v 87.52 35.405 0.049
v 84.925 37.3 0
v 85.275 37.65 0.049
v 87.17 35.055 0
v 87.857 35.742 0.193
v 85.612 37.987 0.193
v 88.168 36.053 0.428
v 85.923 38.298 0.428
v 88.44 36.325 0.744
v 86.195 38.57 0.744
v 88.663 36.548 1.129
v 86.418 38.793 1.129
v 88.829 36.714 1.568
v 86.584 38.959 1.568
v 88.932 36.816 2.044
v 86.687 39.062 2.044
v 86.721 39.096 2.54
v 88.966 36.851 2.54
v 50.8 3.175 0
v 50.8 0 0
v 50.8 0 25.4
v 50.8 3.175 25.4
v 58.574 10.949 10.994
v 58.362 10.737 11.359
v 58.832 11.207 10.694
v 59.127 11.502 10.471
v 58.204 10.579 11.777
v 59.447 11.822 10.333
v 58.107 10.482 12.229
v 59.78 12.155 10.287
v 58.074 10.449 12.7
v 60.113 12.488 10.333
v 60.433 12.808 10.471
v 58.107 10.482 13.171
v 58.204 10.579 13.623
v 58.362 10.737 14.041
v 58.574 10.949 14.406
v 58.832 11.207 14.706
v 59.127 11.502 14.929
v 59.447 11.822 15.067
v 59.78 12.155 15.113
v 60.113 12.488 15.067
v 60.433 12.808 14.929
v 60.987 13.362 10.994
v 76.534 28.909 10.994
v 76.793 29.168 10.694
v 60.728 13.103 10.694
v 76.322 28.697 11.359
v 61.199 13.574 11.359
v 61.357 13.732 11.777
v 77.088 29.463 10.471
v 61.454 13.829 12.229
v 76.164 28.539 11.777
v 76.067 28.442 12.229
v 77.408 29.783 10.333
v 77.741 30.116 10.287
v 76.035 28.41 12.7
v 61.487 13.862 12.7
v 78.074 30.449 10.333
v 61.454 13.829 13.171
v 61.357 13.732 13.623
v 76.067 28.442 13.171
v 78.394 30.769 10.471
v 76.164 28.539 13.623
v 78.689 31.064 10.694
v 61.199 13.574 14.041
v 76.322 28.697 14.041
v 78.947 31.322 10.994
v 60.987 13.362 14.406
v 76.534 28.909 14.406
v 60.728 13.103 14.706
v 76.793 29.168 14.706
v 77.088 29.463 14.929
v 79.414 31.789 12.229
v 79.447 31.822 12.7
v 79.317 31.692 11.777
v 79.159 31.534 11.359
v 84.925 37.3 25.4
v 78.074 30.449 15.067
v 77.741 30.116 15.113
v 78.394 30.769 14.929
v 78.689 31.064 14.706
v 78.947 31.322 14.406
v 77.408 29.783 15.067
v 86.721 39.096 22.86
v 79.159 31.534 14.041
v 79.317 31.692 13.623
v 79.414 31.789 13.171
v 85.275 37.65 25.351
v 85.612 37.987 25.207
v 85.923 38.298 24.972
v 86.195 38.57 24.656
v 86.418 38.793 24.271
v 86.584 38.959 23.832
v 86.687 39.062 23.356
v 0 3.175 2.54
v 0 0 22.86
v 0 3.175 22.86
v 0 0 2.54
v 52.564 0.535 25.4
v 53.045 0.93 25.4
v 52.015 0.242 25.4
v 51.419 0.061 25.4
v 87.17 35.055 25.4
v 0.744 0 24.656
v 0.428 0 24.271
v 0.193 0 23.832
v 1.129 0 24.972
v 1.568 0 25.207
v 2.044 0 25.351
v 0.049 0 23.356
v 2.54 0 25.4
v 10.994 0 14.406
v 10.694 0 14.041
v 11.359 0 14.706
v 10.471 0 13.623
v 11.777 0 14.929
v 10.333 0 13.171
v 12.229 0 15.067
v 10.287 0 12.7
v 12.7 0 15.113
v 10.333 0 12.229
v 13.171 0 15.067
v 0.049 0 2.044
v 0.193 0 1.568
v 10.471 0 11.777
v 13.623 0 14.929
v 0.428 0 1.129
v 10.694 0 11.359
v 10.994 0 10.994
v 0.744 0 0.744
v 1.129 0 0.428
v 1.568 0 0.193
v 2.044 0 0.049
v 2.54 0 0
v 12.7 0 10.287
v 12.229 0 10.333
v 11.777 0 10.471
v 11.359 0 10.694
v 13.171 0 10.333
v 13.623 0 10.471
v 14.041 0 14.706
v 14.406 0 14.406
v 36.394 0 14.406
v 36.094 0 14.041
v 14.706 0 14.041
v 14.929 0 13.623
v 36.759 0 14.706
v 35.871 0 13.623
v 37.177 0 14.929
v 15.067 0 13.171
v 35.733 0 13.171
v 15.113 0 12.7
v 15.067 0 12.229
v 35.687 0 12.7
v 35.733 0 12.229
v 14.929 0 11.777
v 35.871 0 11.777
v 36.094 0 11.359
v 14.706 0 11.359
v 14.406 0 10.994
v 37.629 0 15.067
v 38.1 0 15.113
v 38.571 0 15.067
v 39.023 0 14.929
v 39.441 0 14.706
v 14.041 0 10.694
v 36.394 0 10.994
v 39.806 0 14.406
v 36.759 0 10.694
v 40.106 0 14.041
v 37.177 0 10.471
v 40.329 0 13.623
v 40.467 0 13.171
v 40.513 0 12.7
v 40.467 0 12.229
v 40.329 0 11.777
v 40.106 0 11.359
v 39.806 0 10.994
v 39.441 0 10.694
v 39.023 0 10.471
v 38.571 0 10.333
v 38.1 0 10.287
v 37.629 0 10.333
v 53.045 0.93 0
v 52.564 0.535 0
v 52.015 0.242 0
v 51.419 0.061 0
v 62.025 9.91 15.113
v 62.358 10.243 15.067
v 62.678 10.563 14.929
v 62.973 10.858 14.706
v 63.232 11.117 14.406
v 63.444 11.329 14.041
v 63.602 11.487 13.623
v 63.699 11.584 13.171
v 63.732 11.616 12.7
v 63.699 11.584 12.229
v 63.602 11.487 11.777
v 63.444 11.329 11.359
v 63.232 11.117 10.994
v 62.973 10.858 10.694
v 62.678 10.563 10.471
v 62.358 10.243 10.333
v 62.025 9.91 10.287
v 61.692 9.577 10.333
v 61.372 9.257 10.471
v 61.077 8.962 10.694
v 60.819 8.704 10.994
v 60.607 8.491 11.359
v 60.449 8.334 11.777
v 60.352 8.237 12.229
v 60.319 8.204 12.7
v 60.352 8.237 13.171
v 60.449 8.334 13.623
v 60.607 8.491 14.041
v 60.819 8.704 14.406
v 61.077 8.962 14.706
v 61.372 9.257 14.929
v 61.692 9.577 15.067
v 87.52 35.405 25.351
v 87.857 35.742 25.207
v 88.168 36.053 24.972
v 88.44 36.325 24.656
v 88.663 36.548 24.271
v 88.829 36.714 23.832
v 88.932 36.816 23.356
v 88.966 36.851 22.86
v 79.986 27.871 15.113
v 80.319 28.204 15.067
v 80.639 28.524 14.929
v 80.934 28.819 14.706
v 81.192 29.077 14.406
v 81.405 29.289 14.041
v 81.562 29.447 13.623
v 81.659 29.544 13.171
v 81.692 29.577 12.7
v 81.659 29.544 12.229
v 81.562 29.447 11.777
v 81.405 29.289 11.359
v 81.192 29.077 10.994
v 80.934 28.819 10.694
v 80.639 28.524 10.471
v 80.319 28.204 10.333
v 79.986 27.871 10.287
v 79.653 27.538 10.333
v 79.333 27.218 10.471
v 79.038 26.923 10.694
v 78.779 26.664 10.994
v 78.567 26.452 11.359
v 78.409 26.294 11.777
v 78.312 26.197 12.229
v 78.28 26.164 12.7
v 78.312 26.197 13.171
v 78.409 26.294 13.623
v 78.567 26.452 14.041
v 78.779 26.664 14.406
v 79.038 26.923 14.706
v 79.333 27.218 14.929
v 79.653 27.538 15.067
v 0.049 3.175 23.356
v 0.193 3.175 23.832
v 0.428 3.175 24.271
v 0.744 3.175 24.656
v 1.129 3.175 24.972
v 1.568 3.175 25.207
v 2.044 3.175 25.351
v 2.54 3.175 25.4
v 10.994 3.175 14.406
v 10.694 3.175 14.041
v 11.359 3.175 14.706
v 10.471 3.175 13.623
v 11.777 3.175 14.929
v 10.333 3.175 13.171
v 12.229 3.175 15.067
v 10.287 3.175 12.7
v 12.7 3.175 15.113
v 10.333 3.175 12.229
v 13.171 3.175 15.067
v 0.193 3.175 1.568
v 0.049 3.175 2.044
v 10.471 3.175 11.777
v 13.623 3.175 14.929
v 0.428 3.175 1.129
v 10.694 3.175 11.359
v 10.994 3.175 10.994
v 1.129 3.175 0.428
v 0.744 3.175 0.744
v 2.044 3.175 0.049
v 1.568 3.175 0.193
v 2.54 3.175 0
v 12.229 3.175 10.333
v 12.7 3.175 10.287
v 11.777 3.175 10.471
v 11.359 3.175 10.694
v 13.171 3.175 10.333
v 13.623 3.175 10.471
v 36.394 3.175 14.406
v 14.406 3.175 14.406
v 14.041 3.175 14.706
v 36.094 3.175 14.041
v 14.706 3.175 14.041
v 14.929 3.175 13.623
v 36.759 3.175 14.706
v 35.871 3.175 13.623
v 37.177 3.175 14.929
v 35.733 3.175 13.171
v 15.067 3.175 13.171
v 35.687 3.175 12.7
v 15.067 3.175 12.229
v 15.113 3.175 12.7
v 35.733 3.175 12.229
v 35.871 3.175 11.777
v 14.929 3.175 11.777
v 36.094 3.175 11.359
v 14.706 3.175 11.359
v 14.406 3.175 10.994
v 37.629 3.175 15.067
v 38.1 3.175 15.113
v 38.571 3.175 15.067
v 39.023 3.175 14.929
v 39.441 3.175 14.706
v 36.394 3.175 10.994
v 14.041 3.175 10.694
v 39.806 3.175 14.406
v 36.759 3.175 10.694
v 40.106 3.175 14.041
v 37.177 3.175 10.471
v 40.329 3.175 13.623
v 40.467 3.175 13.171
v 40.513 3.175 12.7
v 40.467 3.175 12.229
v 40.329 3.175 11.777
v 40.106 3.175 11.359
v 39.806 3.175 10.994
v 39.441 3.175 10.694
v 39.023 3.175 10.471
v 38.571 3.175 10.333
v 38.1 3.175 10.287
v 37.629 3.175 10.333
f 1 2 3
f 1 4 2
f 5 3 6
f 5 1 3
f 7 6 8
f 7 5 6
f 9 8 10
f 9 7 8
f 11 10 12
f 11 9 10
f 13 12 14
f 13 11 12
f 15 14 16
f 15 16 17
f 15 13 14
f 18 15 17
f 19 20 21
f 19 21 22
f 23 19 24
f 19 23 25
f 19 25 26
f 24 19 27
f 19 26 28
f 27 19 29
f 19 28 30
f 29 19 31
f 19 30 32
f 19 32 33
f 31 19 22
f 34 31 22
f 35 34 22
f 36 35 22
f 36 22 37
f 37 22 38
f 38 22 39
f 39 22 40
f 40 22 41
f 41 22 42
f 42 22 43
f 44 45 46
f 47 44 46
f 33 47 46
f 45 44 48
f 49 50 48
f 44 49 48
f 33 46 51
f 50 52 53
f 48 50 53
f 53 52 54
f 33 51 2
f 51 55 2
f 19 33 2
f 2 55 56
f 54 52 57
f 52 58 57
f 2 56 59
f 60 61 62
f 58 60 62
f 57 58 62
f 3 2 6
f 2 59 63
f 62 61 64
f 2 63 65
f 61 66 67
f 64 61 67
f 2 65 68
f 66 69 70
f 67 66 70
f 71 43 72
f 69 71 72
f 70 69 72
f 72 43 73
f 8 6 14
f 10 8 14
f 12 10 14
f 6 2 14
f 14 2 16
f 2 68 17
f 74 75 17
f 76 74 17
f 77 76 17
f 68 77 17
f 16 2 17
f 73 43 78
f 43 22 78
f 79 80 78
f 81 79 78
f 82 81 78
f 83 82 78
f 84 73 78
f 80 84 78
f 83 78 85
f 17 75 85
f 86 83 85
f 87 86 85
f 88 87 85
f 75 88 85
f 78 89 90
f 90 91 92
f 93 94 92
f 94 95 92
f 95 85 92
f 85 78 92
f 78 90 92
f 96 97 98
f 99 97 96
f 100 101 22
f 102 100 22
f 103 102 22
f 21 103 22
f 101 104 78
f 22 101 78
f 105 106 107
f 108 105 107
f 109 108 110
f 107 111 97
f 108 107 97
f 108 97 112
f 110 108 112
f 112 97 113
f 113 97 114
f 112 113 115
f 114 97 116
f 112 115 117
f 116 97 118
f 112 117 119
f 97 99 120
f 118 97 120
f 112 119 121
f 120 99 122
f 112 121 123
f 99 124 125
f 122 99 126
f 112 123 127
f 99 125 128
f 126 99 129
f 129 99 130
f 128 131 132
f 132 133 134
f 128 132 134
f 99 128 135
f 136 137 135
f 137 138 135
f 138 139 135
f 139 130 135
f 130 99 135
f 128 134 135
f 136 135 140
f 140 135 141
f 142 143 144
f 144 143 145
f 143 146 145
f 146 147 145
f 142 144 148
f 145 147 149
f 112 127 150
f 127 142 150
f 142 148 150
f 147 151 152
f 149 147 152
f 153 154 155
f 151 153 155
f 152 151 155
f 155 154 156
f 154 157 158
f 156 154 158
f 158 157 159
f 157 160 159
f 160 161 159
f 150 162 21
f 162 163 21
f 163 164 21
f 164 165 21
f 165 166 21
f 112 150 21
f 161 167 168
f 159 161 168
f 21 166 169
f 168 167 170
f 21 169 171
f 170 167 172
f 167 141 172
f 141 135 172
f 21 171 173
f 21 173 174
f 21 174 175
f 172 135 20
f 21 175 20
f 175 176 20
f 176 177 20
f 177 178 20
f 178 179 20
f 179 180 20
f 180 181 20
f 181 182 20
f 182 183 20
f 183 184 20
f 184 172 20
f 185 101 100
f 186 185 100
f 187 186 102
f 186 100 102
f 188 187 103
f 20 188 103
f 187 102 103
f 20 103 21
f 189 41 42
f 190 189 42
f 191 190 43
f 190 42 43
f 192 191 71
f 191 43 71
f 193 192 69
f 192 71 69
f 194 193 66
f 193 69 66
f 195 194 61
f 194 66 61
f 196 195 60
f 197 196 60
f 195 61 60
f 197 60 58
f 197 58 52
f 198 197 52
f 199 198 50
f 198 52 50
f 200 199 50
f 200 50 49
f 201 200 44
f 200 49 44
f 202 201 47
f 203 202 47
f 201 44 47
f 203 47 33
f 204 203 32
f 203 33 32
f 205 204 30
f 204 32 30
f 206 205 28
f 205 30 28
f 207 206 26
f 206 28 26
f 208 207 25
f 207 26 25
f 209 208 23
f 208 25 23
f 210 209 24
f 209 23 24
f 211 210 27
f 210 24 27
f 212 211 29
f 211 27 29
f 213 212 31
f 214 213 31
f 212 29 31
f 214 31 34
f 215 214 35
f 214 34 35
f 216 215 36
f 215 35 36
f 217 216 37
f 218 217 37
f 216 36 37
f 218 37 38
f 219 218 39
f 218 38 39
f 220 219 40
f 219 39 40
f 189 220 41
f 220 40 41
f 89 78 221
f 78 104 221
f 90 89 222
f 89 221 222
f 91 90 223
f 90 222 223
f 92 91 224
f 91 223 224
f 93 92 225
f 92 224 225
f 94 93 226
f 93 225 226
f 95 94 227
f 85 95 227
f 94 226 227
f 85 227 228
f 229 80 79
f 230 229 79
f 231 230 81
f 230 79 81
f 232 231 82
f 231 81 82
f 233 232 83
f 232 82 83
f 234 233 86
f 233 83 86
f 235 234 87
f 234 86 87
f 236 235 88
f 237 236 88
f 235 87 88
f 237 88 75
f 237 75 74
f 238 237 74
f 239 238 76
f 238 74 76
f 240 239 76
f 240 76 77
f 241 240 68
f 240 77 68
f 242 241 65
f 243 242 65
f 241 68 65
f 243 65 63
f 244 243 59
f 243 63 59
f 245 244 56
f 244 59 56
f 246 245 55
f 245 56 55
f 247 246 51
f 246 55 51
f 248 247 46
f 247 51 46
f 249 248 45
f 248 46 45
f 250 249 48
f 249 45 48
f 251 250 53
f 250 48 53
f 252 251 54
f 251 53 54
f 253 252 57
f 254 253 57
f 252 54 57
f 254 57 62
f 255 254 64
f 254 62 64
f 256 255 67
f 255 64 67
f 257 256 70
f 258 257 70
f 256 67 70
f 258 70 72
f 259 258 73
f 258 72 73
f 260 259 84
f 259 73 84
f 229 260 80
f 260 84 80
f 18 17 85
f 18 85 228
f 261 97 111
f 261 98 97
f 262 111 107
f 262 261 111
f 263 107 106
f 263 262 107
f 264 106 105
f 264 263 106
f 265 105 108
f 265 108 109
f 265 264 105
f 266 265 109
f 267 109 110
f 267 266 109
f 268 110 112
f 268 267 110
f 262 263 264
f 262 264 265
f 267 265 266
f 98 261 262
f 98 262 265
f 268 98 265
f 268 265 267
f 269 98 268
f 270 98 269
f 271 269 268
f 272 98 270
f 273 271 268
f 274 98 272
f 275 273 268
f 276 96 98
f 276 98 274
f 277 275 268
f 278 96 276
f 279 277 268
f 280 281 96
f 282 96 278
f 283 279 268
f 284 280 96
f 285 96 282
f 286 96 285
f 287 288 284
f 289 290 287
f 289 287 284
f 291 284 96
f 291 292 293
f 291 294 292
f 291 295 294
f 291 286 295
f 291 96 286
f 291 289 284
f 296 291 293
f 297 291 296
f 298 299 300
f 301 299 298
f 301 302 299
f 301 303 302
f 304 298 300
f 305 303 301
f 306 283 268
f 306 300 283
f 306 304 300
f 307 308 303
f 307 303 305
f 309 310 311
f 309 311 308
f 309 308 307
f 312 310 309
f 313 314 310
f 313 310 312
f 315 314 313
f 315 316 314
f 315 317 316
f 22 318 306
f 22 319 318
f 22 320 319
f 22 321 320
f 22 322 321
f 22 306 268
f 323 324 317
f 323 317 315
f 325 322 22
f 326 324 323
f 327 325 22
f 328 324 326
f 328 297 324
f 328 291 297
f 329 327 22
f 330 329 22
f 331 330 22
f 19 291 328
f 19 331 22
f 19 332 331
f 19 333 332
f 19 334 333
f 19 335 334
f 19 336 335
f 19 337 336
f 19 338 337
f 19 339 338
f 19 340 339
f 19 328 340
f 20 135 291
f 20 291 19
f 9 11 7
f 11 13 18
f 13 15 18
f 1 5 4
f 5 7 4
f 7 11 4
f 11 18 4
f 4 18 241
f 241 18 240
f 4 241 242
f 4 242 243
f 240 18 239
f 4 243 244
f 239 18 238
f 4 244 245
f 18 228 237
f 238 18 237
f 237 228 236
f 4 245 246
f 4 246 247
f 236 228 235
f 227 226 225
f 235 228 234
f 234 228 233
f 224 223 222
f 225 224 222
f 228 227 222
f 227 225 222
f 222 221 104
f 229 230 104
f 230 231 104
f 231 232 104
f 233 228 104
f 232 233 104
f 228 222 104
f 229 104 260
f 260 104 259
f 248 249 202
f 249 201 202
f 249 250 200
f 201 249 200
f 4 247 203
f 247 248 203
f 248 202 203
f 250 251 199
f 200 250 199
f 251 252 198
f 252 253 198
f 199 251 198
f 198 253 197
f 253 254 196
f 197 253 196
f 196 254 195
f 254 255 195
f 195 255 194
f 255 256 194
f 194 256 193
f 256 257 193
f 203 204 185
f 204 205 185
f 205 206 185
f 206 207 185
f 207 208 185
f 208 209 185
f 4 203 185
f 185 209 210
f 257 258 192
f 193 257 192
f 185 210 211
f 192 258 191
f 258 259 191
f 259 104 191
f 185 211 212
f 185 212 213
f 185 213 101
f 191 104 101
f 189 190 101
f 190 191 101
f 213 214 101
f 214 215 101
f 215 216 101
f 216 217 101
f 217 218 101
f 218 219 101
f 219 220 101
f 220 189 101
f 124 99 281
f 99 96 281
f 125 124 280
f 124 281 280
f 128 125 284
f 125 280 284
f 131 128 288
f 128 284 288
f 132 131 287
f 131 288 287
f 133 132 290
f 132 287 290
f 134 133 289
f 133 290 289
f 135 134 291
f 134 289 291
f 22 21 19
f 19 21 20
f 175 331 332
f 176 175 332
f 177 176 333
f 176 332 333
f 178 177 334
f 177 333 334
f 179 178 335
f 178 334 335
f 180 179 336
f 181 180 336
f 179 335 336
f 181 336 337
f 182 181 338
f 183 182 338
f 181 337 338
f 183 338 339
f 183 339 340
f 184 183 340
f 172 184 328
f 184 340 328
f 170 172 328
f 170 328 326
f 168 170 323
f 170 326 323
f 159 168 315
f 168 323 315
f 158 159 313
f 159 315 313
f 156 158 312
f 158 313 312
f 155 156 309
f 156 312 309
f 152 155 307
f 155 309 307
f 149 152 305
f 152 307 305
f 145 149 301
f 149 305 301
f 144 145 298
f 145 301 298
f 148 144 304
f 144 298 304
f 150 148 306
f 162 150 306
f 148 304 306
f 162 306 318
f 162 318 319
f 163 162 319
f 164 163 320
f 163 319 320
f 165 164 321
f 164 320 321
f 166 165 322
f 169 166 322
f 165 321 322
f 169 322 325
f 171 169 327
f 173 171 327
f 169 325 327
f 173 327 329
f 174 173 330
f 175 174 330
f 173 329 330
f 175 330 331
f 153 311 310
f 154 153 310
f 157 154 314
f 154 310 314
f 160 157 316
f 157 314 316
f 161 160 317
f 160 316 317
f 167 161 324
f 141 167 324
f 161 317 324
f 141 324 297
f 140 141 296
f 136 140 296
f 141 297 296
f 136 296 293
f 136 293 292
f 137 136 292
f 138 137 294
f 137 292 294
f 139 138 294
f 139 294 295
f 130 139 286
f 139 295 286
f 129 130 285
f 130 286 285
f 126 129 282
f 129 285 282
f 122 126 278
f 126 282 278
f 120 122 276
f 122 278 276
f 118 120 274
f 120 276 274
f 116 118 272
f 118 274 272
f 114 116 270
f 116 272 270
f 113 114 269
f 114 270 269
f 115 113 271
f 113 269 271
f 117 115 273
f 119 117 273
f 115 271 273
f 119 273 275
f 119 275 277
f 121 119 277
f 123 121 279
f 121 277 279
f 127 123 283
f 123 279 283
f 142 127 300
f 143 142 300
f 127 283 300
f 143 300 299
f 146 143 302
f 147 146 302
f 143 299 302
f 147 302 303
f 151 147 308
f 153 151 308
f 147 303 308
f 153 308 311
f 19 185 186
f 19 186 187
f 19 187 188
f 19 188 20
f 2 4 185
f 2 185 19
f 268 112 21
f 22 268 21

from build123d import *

# Parameters (mm, degrees)
SKETCH1_W           = 50.8
SKETCH1_H           = 25.4
BOSS_EXTRUDE1_DEPTH = 3.175
BOSS_EXTRUDE2_DEPTH = 25.4
SKETCH4_R           = 2.413
CUT_EXTRUDE1_DEPTH  = 3.175
SKETCH5_R           = 2.413
CUT_EXTRUDE2_DEPTH  = 3.175
FILLET1_R           = 2.54
FILLET2_R           = 2.54


with BuildPart() as part:
    # Sketch1 → Boss-Extrude1 (new body)
    with BuildSketch(Plane(origin=(0, 0, 0), x_dir=(1, 0, 0), z_dir=(0, 1, 0))):
        with Locations((25.4, -12.7)):
            Rectangle(SKETCH1_W, SKETCH1_H)
    extrude(amount=BOSS_EXTRUDE1_DEPTH)

    # Sketch4 → Cut-Extrude1 (cut)
    with BuildSketch(Plane(origin=(0, 3.175, 0), x_dir=(1, 0, 0), z_dir=(0, 1, 0))):
        with Locations((38.1, -12.7)):
            Circle(SKETCH4_R)
        with Locations((12.7, -12.7)):
            Circle(SKETCH4_R)
    extrude(amount=-CUT_EXTRUDE1_DEPTH, mode=Mode.SUBTRACT)

    # Fillet2
    fillet2_edges = [part.edges().sort_by_distance(p)[0] for p in [
        (0, 1.5875, 0),
        (0, 1.5875, 25.4),
    ]]
    fillet(fillet2_edges, radius=FILLET2_R)


with BuildPart() as body_2:
    # Sketch2 → Boss-Extrude2 (new body)
    with BuildSketch(Plane.XY.offset(25.4)):
        with BuildLine():
            Line((50.8, 3.175), (86.721024484, 39.096024484))
            Line((86.721024484, 39.096024484), (88.966088515, 36.850960454))
            Line((88.966088515, 36.850960454), (53.04506403, 0.92993597))
            ThreePointArc((53.04506403, 0.92993597), (52.015019898, 0.241682484), (50.8, 0))
            Line((50.8, 0), (50.8, 3.175))
        make_face()
    extrude(amount=-BOSS_EXTRUDE2_DEPTH)

    # Sketch5 → Cut-Extrude2 (cut)
    with BuildSketch(Plane(origin=(23.8125, -23.8125, 0), x_dir=(0, 0, 1), z_dir=(-0.707106781, 0.707106781, 0))):
        with Locations((12.7, 50.866088515)):
            Circle(SKETCH5_R)
        with Locations((12.7, 76.266088515)):
            Circle(SKETCH5_R)
    extrude(amount=-CUT_EXTRUDE2_DEPTH, mode=Mode.SUBTRACT)

    # Fillet1
    fillet1_edges = [body_2.edges().sort_by_distance(p)[0] for p in [
        (87.843556499, 37.973492469, 0),
        (87.843556499, 37.973492469, 25.4),
    ]]
    fillet(fillet1_edges, radius=FILLET1_R)


solid = Compound([part.part, body_2.part])
